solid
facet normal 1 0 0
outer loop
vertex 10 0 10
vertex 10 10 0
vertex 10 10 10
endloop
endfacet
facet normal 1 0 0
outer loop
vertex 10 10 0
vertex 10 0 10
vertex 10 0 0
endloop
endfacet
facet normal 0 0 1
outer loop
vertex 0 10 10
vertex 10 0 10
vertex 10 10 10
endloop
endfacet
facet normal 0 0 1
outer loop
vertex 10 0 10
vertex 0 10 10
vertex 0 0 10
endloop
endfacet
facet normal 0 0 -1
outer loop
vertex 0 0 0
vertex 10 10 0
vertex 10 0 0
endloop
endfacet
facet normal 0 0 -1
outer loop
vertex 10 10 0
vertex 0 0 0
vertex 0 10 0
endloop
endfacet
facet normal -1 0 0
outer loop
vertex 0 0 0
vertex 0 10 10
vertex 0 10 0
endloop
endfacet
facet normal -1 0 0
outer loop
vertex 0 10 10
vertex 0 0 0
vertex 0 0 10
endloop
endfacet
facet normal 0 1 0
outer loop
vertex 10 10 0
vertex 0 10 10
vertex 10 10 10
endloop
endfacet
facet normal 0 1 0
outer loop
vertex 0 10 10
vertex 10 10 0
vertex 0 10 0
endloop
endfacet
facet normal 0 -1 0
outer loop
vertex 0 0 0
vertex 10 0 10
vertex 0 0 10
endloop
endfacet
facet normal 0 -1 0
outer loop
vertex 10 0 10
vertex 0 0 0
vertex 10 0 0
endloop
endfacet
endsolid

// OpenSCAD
// Color transformation with string parameter
color("red") cube(10);

// Color transformation with vector parameter
color([1, 0, 0]) cube(10);

// Offset transformation with r parameter
offset(r=2) square(10);
